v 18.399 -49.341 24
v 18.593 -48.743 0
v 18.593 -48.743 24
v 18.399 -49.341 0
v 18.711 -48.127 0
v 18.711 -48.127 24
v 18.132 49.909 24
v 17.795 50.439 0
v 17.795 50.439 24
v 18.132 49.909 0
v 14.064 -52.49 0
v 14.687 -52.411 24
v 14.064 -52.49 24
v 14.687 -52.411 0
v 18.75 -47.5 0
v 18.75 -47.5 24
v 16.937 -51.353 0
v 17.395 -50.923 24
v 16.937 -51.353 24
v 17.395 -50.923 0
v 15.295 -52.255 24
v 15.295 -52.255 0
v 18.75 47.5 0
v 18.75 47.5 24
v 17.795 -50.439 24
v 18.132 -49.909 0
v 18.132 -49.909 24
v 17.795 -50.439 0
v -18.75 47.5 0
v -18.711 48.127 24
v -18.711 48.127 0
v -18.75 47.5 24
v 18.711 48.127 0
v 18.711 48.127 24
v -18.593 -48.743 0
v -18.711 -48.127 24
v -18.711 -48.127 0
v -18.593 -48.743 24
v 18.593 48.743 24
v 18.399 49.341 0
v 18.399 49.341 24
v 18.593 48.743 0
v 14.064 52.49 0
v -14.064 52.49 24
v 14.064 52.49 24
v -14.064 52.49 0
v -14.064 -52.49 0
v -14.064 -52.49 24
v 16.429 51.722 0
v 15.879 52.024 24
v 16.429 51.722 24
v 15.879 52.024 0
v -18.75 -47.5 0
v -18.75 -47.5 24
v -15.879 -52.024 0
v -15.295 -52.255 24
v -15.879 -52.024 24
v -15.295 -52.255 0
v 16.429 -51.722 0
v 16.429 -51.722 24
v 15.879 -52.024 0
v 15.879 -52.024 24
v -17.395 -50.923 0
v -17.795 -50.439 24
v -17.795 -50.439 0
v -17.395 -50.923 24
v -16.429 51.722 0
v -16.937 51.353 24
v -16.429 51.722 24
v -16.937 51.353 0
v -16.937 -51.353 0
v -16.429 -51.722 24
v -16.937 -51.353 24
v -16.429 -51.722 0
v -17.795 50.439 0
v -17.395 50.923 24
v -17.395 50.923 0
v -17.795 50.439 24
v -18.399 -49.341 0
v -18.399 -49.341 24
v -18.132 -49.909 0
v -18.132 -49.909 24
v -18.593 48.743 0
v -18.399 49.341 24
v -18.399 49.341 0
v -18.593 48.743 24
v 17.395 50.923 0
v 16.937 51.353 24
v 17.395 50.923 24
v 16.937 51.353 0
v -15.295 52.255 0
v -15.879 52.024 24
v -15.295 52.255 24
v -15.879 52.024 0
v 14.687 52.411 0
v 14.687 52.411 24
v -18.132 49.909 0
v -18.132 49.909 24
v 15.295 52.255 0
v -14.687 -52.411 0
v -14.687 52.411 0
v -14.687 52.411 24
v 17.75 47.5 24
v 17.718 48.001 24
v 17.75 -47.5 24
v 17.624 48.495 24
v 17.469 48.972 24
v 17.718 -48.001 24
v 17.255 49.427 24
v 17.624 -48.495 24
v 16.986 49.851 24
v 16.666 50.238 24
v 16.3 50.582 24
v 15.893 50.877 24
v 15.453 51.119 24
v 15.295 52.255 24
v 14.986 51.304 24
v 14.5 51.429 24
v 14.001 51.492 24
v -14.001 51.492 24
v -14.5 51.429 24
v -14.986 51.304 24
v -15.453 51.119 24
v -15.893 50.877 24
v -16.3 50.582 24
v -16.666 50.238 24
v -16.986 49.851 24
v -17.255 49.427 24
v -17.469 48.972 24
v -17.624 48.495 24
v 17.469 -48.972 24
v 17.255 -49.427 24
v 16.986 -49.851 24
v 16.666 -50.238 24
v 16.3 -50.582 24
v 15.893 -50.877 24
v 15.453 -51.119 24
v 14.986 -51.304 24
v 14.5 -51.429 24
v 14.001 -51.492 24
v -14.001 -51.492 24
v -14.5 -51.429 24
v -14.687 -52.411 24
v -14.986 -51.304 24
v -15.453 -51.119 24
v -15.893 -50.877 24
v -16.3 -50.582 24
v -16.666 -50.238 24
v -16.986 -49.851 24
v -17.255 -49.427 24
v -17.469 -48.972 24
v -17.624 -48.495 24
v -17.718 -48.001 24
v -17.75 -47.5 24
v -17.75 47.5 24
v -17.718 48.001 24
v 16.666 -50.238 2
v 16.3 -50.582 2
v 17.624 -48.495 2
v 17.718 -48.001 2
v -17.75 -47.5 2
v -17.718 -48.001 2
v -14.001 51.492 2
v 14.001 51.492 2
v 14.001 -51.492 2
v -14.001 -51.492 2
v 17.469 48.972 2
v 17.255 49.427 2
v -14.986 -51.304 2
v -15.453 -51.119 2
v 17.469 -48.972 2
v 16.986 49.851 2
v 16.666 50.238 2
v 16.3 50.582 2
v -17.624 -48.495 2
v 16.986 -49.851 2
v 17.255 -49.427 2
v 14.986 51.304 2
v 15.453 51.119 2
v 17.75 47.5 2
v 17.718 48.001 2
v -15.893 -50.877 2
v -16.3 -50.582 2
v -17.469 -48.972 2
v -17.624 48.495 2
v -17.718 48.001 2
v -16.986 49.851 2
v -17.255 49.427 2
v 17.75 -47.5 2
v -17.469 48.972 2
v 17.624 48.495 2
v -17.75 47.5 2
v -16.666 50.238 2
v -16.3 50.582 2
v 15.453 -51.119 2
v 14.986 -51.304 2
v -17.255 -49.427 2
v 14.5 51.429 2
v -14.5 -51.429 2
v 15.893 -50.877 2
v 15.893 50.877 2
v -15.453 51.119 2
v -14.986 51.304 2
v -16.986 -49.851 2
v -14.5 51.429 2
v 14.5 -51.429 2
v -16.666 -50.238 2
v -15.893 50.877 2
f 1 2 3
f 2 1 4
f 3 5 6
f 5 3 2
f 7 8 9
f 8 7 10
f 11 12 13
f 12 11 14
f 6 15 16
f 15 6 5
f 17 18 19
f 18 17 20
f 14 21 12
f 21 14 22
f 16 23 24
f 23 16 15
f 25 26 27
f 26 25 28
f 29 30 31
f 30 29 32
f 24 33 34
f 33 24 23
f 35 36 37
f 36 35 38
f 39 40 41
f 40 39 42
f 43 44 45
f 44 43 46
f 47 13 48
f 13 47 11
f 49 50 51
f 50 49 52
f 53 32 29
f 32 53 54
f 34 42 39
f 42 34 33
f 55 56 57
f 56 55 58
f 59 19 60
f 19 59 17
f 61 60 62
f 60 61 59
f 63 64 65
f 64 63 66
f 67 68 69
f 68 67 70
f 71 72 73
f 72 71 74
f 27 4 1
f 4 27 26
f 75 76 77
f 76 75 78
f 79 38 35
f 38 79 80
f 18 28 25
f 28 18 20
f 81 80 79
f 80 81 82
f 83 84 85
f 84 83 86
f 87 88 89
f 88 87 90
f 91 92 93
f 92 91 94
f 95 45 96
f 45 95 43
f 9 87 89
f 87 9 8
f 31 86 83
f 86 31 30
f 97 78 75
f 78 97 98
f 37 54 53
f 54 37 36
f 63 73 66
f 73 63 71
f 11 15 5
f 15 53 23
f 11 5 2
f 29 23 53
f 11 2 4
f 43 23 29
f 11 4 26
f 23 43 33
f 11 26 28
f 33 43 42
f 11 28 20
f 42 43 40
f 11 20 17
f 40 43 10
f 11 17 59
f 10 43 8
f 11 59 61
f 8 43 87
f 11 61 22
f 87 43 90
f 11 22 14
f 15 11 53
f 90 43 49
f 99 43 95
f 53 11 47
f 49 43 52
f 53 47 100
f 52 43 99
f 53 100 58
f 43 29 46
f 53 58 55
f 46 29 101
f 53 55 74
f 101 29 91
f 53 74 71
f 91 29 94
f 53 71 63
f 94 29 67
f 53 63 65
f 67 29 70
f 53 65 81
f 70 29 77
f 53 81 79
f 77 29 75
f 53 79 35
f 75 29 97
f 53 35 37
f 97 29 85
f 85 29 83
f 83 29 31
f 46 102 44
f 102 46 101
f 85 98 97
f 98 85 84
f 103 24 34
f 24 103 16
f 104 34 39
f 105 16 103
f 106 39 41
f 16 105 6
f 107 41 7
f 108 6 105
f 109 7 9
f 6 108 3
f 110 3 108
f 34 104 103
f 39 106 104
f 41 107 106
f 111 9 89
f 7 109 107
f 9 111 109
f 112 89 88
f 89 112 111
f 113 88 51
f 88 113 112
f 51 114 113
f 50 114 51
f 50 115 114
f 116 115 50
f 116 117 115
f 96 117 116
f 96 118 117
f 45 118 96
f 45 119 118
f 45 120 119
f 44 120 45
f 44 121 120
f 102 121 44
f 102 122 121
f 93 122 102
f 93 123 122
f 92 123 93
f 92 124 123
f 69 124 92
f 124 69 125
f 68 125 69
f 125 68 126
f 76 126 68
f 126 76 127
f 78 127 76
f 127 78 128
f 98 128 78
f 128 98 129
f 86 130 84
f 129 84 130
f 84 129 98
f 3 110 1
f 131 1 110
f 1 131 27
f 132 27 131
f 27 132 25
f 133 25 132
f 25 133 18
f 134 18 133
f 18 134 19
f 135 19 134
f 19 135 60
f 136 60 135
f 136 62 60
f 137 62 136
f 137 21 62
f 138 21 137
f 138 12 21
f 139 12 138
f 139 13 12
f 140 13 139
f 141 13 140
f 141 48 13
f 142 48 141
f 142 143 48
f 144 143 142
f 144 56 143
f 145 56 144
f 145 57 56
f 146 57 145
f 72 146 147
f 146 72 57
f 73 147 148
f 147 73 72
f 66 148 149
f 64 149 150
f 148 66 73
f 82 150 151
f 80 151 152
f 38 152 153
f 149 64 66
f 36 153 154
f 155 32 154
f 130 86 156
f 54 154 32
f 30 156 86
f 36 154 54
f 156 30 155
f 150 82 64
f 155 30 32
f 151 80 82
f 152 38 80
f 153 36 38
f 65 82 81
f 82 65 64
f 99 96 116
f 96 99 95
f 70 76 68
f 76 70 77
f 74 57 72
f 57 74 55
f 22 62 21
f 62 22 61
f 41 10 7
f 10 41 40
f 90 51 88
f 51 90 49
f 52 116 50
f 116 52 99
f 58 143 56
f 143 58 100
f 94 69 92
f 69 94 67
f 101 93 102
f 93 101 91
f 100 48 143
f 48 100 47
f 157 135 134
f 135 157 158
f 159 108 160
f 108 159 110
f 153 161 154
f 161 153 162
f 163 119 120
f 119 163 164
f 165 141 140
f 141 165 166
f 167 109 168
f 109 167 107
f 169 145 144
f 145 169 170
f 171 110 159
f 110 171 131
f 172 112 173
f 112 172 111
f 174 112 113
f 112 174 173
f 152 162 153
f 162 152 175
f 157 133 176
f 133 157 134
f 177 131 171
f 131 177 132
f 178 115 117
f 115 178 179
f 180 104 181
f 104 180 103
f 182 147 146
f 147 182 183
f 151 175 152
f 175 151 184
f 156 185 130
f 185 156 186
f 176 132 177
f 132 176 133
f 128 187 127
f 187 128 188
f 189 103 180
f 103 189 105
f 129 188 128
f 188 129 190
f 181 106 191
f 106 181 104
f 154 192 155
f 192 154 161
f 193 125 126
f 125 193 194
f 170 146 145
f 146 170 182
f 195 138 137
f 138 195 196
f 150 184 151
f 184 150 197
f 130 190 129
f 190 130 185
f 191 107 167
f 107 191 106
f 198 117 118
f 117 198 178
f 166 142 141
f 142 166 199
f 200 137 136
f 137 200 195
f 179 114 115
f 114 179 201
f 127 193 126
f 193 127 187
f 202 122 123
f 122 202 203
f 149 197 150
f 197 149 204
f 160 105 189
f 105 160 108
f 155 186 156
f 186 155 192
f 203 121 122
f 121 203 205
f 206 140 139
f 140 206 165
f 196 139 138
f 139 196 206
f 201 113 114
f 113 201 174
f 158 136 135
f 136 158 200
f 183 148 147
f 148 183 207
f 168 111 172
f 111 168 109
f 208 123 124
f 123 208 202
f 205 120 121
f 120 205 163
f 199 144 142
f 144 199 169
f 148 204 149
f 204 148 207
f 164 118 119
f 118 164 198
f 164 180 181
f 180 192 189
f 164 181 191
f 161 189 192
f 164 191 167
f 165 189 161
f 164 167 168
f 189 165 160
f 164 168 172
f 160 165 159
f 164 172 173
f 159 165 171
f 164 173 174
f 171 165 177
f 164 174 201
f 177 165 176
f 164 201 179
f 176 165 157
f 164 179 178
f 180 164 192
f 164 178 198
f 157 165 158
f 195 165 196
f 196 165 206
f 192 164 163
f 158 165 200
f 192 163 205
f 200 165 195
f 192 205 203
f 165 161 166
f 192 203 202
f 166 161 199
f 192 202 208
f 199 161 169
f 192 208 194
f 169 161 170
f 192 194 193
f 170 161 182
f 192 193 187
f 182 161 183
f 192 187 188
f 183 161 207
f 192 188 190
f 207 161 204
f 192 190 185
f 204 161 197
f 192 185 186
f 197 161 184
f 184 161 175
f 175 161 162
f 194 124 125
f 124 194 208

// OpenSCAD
$fn = 50;


difference() {
	union() {
		hull() {
			translate(v = [-13.7500000000, 47.5000000000, 0]) {
				cylinder(h = 24, r = 5);
			}
			translate(v = [13.7500000000, 47.5000000000, 0]) {
				cylinder(h = 24, r = 5);
			}
			translate(v = [-13.7500000000, -47.5000000000, 0]) {
				cylinder(h = 24, r = 5);
			}
			translate(v = [13.7500000000, -47.5000000000, 0]) {
				cylinder(h = 24, r = 5);
			}
		}
	}
	union() {
		translate(v = [0, 0, 2]) {
			hull() {
				translate(v = [-13.7500000000, 47.5000000000, 0]) {
					cylinder(h = 22, r = 4);
				}
				translate(v = [13.7500000000, 47.5000000000, 0]) {
					cylinder(h = 22, r = 4);
				}
				translate(v = [-13.7500000000, -47.5000000000, 0]) {
					cylinder(h = 22, r = 4);
				}
				translate(v = [13.7500000000, -47.5000000000, 0]) {
					cylinder(h = 22, r = 4);
				}
			}
		}
	}
}
